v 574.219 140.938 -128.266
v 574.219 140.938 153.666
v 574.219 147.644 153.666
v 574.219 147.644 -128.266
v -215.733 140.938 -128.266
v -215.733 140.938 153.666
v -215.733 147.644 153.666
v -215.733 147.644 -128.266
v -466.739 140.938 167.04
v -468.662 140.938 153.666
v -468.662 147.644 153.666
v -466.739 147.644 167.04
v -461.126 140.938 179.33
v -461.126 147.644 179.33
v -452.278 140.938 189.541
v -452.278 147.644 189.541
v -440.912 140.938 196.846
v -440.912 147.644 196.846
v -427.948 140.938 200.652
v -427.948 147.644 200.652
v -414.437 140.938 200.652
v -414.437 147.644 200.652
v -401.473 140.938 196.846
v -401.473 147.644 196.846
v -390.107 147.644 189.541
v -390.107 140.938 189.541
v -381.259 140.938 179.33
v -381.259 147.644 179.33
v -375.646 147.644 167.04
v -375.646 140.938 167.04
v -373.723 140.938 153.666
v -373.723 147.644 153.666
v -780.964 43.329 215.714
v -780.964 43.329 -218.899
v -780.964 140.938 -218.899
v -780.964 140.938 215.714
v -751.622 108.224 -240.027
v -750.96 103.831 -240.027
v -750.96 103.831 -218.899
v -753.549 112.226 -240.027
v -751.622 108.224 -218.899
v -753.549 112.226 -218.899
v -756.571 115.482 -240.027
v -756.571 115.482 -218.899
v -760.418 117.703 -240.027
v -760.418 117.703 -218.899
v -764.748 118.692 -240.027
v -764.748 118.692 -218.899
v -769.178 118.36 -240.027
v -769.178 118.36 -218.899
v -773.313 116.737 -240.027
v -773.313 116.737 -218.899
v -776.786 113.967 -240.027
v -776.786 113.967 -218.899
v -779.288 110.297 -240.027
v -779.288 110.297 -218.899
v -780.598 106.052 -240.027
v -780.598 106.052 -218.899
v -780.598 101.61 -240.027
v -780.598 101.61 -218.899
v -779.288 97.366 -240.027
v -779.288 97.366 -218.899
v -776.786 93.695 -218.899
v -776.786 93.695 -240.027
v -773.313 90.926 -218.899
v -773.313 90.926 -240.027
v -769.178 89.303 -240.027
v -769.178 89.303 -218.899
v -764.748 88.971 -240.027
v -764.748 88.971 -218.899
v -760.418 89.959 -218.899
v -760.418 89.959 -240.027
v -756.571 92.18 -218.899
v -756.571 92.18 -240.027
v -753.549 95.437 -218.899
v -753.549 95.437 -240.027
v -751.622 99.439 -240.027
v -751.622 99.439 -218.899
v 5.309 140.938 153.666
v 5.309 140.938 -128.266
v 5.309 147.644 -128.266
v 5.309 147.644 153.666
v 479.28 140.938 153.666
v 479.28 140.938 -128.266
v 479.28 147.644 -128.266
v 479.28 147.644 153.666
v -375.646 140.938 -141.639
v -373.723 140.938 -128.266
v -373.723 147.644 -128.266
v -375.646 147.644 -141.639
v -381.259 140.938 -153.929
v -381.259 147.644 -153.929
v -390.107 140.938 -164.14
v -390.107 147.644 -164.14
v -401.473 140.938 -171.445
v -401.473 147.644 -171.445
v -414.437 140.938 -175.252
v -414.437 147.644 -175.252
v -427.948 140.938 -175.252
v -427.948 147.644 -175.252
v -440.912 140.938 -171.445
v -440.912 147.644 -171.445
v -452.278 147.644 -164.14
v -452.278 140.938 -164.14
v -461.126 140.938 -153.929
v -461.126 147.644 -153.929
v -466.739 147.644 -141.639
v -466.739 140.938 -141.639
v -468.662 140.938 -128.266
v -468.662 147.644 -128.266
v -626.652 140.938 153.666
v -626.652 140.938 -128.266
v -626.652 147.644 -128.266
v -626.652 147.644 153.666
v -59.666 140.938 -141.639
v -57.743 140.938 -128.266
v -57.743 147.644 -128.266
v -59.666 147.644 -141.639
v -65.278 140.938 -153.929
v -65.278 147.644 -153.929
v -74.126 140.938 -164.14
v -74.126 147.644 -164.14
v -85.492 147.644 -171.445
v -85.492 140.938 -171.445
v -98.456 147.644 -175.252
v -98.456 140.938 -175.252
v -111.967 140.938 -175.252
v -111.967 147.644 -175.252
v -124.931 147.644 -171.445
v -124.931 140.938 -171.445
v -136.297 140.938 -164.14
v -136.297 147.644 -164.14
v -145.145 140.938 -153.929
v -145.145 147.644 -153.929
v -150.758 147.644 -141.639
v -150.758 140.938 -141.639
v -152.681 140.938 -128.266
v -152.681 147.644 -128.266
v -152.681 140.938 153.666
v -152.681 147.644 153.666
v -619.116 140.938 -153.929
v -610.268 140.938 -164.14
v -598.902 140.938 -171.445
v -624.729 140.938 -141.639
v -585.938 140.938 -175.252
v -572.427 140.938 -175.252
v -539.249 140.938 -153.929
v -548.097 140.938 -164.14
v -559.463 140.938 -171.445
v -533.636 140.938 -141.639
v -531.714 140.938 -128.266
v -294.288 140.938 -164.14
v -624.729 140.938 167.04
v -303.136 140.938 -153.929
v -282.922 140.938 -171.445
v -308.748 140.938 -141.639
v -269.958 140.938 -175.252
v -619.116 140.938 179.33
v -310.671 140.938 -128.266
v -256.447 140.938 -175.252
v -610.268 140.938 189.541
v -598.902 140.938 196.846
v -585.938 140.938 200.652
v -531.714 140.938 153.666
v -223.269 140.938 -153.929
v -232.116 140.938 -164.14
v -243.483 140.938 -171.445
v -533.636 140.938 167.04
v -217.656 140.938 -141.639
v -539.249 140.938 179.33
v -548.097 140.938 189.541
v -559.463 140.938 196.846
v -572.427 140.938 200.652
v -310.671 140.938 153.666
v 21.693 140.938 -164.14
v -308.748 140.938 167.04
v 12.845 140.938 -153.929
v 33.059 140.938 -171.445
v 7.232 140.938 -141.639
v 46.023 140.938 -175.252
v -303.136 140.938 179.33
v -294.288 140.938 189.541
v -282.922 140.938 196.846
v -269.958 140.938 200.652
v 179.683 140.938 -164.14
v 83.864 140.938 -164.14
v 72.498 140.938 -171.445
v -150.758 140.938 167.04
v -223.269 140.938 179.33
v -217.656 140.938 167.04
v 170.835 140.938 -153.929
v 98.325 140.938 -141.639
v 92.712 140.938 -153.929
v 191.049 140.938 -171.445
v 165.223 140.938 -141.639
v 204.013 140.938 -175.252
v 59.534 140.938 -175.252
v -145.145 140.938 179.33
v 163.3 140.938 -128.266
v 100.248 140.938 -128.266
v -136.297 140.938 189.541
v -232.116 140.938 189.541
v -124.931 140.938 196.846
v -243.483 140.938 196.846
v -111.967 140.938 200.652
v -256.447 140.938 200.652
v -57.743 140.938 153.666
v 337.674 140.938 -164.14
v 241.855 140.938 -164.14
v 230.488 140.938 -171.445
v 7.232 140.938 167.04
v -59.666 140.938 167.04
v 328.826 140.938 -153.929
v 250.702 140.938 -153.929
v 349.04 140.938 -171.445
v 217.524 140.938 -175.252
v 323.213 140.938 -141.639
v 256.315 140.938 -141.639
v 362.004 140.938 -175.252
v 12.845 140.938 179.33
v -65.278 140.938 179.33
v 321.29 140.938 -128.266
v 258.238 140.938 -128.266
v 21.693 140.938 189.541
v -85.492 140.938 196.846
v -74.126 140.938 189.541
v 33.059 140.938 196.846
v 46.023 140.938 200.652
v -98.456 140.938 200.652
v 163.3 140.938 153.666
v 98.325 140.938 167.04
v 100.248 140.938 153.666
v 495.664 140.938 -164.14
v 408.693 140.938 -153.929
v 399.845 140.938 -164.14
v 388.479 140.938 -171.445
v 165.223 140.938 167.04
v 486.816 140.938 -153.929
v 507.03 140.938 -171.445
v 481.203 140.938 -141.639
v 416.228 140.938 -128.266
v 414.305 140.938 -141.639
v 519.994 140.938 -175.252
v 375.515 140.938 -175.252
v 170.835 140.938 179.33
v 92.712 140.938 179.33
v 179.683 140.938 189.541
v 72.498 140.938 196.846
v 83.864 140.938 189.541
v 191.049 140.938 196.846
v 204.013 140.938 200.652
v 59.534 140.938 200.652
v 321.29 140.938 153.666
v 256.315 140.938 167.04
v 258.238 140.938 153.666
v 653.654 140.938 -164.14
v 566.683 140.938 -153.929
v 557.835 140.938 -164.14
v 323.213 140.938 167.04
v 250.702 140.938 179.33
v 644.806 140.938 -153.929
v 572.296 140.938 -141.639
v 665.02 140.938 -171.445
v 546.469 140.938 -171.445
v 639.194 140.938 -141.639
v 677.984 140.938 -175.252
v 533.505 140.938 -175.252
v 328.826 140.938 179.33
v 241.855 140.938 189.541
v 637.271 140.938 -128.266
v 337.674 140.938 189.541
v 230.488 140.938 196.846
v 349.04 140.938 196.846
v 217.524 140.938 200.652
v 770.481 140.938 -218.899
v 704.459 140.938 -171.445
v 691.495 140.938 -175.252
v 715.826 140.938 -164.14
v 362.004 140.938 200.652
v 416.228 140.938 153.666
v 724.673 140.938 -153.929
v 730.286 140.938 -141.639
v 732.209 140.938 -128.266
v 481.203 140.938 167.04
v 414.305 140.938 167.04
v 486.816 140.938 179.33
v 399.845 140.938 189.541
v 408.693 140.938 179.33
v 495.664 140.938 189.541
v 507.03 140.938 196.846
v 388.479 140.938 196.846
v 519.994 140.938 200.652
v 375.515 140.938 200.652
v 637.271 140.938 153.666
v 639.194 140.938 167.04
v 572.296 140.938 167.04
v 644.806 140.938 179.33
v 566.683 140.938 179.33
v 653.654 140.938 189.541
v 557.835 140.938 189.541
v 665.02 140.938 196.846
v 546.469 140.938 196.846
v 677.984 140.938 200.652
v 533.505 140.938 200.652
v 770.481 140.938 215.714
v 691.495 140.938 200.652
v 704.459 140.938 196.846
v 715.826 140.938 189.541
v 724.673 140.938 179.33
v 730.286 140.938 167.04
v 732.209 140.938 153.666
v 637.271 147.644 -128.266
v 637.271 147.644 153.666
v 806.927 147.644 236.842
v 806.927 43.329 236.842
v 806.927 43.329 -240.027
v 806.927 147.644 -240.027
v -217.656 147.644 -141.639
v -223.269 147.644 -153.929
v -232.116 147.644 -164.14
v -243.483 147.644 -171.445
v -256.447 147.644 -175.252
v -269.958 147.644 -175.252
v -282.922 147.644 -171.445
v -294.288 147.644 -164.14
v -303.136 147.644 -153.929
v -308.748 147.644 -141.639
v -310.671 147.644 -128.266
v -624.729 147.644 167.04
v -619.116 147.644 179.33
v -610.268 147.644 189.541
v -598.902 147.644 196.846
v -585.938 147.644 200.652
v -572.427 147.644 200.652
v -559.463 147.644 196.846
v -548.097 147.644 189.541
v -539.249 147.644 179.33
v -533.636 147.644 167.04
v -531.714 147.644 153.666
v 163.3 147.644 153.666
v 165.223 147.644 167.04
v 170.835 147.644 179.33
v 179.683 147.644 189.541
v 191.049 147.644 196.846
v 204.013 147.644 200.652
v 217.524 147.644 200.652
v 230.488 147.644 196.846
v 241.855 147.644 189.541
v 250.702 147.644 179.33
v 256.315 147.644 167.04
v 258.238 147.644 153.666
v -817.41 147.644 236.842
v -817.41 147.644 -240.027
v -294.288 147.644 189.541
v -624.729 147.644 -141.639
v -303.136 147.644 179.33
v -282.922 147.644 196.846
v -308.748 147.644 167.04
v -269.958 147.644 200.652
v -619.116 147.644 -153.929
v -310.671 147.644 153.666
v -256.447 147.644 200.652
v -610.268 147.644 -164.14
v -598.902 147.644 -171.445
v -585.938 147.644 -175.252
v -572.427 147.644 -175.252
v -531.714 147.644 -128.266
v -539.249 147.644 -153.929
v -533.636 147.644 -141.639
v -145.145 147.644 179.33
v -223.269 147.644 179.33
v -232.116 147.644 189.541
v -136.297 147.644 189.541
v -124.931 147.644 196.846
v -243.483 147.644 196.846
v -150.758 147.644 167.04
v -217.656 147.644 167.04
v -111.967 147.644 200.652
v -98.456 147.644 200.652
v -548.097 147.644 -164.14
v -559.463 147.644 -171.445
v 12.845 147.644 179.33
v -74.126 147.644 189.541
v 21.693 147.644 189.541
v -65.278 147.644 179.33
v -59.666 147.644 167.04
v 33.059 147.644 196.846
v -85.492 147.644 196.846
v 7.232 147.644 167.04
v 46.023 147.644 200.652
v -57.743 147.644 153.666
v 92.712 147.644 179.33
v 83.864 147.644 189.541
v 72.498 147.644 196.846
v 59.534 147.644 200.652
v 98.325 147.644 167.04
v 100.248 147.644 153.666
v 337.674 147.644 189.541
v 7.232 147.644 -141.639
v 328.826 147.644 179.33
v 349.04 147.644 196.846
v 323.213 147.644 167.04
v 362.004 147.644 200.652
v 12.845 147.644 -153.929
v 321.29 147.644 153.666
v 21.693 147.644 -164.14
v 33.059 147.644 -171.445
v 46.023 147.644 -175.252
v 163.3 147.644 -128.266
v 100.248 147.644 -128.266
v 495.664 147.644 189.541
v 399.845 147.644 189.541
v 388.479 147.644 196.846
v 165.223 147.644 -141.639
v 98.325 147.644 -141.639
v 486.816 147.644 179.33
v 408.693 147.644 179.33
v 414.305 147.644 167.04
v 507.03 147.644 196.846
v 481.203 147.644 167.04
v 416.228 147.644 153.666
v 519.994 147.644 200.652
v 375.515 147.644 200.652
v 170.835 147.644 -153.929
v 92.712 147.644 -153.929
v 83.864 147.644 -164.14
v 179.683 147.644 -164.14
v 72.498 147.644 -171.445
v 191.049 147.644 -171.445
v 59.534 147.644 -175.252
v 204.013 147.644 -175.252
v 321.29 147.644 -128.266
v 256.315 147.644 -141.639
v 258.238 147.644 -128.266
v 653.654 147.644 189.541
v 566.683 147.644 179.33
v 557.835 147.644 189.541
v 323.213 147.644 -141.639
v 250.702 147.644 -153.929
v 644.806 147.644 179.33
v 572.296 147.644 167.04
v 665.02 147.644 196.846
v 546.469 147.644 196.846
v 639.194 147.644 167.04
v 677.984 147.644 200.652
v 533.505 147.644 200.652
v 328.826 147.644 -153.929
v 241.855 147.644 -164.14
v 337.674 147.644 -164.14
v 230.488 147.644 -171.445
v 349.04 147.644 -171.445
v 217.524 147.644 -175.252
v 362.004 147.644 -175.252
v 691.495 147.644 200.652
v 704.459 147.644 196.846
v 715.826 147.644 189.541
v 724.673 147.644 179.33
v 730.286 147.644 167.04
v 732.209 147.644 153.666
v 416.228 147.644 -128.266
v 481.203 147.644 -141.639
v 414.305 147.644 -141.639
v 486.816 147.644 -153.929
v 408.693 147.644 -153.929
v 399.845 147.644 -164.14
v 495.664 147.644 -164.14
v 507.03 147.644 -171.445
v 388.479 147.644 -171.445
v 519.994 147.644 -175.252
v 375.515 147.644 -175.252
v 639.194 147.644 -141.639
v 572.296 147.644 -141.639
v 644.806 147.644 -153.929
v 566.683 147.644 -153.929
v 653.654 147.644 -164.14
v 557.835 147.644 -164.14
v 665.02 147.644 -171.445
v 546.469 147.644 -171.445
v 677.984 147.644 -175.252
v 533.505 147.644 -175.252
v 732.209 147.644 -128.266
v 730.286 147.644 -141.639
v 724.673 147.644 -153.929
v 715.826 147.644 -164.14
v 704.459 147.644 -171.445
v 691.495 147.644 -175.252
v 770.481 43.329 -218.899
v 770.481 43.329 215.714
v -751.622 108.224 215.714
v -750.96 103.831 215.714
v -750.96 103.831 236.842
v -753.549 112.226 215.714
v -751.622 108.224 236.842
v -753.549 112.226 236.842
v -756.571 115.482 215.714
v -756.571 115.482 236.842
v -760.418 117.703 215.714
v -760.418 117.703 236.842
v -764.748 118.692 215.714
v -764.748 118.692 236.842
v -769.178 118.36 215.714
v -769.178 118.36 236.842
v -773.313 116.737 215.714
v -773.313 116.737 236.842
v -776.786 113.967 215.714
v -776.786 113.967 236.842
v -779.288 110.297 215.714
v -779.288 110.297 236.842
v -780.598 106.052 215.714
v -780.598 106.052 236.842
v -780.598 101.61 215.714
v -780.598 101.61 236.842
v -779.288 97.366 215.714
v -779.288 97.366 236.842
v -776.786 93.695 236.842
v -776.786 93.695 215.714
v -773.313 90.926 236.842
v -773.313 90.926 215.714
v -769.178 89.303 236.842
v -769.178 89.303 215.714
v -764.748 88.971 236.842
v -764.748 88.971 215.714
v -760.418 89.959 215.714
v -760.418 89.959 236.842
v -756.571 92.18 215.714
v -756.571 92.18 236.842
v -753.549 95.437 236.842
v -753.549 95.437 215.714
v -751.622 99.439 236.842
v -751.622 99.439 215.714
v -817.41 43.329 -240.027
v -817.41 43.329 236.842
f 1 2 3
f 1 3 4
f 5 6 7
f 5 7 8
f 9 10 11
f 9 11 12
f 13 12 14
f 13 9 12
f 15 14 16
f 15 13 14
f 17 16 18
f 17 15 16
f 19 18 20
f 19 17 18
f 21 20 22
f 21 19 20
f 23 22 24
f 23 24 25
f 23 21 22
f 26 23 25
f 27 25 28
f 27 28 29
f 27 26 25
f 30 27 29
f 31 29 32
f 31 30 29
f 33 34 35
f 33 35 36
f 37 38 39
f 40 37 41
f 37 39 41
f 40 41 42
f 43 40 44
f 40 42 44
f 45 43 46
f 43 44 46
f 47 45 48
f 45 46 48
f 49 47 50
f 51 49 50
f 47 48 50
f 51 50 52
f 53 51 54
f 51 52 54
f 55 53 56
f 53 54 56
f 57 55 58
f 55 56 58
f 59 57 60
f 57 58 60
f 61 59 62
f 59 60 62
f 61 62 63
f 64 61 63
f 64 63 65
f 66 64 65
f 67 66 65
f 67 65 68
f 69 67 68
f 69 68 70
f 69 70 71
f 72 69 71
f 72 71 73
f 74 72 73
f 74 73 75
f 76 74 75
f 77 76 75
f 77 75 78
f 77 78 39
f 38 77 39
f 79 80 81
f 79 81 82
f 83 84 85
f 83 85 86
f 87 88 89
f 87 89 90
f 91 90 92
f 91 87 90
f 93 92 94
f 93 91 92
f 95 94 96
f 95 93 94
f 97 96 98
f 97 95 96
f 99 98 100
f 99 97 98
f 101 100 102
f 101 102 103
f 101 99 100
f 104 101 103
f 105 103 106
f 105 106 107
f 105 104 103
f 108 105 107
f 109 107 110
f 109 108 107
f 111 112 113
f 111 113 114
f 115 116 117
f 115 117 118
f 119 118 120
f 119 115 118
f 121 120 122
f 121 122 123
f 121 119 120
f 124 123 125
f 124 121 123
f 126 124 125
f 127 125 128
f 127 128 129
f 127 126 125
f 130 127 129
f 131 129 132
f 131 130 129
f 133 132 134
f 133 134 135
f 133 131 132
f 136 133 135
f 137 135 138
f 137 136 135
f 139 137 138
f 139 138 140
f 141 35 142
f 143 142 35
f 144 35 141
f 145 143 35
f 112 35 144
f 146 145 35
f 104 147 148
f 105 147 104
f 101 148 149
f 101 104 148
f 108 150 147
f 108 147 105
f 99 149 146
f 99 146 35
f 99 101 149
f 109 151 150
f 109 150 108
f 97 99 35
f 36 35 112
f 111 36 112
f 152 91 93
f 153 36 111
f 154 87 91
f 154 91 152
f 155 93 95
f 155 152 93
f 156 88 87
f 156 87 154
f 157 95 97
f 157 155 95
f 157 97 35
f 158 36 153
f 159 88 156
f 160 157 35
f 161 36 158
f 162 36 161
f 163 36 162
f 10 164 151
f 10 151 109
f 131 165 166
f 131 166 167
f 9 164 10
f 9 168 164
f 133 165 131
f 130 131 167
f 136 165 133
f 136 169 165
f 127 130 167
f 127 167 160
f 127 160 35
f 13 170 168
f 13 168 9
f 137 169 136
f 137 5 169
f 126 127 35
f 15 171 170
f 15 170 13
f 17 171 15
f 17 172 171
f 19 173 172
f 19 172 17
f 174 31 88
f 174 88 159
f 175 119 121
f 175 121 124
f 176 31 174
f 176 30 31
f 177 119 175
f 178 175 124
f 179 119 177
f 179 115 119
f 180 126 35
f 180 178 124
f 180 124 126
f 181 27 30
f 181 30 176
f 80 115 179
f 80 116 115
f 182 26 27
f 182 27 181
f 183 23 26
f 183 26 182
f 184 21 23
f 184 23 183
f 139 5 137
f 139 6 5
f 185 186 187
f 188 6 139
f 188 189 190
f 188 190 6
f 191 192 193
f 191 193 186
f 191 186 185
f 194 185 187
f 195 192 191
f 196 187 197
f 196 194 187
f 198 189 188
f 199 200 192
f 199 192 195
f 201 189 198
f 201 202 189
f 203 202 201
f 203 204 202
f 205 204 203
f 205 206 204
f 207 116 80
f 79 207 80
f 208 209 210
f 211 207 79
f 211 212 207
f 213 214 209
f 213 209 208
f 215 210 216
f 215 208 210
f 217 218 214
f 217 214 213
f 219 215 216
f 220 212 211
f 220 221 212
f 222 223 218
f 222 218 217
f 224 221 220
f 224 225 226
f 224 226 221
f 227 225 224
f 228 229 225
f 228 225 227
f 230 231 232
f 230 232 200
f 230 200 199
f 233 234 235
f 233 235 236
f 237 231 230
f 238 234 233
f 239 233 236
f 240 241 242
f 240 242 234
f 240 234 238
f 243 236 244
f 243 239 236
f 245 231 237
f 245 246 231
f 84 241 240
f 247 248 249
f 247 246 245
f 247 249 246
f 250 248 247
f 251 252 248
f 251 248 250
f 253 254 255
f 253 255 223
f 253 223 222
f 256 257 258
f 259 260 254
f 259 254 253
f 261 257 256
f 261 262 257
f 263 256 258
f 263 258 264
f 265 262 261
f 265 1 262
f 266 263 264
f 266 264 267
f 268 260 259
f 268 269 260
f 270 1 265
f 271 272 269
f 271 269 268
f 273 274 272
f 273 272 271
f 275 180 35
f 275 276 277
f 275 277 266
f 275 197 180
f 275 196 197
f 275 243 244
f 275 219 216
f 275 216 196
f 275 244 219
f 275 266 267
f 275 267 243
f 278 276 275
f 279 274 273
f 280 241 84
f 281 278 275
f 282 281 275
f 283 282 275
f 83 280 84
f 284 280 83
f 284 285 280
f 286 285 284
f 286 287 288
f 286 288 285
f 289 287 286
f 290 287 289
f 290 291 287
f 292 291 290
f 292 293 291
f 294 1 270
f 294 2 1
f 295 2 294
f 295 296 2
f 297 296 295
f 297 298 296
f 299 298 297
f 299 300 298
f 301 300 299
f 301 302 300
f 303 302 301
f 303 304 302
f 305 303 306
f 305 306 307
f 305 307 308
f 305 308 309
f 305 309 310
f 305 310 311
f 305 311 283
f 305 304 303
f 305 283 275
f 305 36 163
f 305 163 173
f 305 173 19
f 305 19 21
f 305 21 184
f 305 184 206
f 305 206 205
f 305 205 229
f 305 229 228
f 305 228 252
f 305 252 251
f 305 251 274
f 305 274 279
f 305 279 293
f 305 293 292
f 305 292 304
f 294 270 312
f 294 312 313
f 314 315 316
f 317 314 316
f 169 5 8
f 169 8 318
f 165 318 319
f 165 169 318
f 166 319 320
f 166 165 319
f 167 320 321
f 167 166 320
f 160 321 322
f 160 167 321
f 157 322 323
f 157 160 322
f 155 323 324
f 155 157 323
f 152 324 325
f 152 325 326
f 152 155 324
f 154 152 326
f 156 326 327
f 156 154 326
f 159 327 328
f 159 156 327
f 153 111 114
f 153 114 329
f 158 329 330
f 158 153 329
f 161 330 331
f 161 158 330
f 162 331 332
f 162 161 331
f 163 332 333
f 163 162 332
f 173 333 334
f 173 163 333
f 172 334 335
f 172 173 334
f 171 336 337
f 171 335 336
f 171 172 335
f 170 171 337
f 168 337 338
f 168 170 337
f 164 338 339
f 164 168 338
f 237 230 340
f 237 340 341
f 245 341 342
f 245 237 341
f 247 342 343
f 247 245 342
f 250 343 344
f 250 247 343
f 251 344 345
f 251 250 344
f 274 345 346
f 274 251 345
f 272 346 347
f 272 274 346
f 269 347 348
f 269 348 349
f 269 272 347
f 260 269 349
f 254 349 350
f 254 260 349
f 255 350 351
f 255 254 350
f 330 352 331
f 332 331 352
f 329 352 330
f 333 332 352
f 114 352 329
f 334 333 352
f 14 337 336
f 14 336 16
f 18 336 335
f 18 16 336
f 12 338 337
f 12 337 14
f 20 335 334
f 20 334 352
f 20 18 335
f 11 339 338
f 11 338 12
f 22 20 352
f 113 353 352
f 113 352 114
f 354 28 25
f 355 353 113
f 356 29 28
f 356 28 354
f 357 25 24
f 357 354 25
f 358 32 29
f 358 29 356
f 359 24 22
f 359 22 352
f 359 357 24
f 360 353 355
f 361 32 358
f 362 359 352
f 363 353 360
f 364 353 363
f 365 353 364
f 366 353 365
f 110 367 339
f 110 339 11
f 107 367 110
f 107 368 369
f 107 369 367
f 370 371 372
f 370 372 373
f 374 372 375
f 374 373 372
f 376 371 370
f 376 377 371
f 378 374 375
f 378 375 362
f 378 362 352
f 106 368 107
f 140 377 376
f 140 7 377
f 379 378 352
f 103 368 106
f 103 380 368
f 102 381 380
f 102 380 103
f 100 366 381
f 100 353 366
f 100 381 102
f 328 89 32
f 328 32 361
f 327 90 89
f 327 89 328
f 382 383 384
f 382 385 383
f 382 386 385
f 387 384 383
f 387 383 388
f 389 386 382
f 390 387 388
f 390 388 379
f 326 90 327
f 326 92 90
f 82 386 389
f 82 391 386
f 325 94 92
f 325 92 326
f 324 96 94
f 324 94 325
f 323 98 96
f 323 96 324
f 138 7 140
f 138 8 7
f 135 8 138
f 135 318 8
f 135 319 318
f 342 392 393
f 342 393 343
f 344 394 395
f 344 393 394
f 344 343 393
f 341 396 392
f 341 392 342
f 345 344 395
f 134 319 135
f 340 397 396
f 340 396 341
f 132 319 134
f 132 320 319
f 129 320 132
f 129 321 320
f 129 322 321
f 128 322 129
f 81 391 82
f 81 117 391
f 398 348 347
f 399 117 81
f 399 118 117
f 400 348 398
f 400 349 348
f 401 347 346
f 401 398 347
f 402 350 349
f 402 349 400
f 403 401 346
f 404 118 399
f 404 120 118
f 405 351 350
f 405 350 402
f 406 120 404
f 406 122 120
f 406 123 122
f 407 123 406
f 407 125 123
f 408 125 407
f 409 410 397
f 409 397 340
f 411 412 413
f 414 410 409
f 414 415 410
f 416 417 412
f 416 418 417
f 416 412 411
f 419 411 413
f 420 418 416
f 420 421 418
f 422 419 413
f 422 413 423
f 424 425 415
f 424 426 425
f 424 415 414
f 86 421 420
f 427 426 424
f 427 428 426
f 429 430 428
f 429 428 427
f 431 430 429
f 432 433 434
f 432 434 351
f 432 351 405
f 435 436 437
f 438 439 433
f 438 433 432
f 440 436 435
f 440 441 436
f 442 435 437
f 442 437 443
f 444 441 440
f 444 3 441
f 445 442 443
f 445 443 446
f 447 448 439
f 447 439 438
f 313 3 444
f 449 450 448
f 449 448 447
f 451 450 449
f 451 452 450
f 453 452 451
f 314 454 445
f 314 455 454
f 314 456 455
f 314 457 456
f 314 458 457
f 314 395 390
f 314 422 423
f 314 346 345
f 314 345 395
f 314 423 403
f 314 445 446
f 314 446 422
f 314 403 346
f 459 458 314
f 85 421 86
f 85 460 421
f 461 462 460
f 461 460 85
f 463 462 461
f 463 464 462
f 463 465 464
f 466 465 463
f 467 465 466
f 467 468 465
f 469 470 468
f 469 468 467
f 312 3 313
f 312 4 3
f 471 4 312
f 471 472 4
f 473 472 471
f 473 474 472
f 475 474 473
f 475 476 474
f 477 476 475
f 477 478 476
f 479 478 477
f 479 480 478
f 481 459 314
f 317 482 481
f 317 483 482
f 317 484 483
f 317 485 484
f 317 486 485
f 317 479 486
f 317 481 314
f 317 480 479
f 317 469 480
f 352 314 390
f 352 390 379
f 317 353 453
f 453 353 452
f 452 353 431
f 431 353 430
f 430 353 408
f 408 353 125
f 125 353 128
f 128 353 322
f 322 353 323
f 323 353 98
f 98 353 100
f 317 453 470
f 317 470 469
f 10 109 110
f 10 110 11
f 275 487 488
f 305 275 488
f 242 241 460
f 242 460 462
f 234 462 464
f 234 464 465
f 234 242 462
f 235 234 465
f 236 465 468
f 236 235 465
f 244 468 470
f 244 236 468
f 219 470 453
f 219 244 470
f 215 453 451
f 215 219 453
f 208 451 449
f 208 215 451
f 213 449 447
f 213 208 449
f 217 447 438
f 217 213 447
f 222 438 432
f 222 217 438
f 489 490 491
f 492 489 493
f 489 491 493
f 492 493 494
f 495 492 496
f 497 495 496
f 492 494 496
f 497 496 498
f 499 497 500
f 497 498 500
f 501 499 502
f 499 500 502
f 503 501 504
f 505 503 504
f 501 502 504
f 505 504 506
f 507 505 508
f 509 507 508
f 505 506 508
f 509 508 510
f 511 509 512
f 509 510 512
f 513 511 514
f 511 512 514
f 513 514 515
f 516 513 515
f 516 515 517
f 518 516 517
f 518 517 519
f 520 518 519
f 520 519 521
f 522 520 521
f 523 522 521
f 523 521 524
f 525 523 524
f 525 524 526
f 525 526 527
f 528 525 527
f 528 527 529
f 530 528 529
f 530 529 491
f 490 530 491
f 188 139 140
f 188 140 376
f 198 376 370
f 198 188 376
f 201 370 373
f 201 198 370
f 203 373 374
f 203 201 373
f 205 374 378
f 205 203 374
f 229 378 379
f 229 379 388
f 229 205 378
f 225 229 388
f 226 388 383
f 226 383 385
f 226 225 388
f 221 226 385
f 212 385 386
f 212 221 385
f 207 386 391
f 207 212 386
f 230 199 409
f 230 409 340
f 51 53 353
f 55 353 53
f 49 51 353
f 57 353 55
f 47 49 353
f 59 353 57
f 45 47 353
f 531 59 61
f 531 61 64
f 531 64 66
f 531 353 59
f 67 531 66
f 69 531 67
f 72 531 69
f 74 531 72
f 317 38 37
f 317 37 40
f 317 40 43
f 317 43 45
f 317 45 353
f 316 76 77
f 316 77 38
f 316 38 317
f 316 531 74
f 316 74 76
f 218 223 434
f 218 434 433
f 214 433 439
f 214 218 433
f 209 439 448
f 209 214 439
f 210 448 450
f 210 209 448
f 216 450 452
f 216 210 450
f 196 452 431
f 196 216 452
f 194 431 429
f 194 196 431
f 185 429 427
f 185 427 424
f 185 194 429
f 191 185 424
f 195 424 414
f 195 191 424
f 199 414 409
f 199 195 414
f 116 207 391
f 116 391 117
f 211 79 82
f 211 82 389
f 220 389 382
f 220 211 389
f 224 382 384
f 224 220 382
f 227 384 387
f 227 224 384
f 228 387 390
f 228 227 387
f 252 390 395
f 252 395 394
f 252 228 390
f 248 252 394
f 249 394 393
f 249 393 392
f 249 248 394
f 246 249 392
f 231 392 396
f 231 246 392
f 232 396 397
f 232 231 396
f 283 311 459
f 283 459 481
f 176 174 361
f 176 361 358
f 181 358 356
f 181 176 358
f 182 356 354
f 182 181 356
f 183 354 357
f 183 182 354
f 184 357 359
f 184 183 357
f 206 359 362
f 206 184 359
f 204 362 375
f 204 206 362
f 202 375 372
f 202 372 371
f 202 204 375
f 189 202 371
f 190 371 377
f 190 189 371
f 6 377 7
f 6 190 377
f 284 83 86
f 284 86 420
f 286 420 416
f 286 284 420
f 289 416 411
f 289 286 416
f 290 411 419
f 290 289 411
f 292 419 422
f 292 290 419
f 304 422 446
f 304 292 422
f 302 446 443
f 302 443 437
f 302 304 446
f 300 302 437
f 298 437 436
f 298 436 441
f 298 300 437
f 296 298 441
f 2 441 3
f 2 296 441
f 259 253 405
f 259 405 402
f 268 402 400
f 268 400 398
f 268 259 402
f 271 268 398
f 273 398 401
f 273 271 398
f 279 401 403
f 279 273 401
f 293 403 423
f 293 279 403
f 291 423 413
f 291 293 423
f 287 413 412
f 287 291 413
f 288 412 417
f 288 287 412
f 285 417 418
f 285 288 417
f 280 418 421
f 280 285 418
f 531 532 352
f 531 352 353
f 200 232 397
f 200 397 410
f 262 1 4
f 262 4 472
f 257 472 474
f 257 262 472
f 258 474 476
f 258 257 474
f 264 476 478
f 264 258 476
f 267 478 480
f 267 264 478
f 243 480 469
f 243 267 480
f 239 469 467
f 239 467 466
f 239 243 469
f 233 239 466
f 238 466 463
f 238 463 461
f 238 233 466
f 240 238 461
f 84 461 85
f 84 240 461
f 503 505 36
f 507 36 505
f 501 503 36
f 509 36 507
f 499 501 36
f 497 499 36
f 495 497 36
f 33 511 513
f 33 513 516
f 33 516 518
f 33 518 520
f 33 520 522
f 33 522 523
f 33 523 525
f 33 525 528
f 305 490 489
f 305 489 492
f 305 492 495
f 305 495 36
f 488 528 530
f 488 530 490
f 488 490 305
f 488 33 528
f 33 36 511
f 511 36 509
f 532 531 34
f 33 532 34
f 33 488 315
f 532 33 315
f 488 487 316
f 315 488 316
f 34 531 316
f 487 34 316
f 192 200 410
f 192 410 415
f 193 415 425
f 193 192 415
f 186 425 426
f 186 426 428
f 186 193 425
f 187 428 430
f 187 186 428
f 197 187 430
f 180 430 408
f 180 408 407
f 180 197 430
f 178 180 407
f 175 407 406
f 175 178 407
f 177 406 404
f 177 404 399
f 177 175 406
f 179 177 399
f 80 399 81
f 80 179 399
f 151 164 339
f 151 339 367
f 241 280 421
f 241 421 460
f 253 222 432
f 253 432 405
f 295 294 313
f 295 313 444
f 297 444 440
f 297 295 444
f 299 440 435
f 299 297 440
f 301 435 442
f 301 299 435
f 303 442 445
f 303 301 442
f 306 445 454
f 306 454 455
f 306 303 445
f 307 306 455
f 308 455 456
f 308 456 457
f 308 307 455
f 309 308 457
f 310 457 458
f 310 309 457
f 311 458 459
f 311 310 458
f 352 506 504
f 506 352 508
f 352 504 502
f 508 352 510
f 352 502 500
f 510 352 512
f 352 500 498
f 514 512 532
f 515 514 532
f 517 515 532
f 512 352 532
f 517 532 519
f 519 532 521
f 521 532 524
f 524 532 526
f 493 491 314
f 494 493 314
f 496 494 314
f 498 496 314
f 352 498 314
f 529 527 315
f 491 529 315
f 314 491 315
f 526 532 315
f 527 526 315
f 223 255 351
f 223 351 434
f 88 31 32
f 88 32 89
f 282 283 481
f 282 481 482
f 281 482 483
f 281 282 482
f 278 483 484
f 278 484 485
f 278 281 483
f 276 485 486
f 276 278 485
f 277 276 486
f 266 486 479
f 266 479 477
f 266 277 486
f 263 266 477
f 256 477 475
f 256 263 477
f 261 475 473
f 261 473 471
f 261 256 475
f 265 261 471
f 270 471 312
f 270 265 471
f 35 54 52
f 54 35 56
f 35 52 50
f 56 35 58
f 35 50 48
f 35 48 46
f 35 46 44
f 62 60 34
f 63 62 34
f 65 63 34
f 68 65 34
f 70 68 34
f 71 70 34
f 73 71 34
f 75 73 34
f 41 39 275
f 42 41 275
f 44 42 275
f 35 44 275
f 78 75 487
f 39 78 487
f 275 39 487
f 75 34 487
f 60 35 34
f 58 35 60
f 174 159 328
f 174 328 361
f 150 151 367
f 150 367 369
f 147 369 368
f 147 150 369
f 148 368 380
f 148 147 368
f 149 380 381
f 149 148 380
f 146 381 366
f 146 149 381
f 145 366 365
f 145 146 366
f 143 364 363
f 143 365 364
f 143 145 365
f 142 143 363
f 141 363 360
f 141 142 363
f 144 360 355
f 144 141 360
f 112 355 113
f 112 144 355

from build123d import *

# Parameters (mm, degrees)
SKETCH1_W           = 2768.6
SKETCH1_H           = 812.8
BOSS_EXTRUDE1_DEPTH = 177.8
SKETCH2_R           = 25.4
CUT_EXTRUDE1_DEPTH  = 831.342
SKETCH3_W           = 2644.359498688
SKETCH3_H           = 740.774814922
CUT_EXTRUDE2_DEPTH  = 166.37
CUT_EXTRUDE3_DEPTH  = 57.912
FILL_START          = 166.37
FILL_PATTERN1_DEPTH = 11.43
SCALE1_SCALE        = 0.5867


# Read off the part's stored shape, not the designer's step: Fill Pattern1
with BuildPart() as part:
    # Sketch1 → Boss-Extrude1 (new body)
    with BuildSketch(Plane(origin=(0, 0, 0), x_dir=(1, 0, 0), z_dir=(0, 1, 0))):
        Rectangle(SKETCH1_W, SKETCH1_H)
    extrude(amount=BOSS_EXTRUDE1_DEPTH)

    # Sketch2 → Cut-Extrude1 (cut)
    with BuildSketch(Plane.XY.offset(406.4)):
        with Locations((-1296.438284971, 103.124)):
            Circle(SKETCH2_R)
    extrude(amount=-CUT_EXTRUDE1_DEPTH, mode=Mode.SUBTRACT)

    # Sketch3 → Cut-Extrude2 (cut)
    with BuildSketch(Plane.XZ):
        Rectangle(SKETCH3_W, SKETCH3_H)
    extrude(amount=-CUT_EXTRUDE2_DEPTH, mode=Mode.SUBTRACT)

    # Sketch12 → Cut-Extrude3 (cut)
    with BuildSketch(Plane.XZ.offset(-166.37)):
        with BuildLine():
            Line((-897.344557037, 264.630737371), (-897.344557037, -215.907837093))
            ThreePointArc((-897.344557037, -215.907837093), (-978.253251545, -296.816531601), (-1059.161946053, -215.907837093))
            Line((-1059.161946053, -215.907837093), (-1059.161946053, 264.630737371))
            ThreePointArc((-1059.161946053, 264.630737371), (-978.253251545, 345.539431879), (-897.344557037, 264.630737371))
        make_face()
    extrude(amount=-CUT_EXTRUDE3_DEPTH, mode=Mode.SUBTRACT)

    # Fill Pattern1 outline → Fill Pattern1 (cut)
    with BuildSketch(Plane(origin=(0, 0, 0), x_dir=(1, 0, 0), z_dir=(0, 1, 0)).offset(FILL_START)):
        with BuildLine():
            ThreePointArc((-789.87554691, -264.630737371), (-708.966852402, -345.539431879), (-628.058157894, -264.630737371))
            Line((-628.058157894, -264.630737371), (-628.058157894, 215.907837093))
            ThreePointArc((-628.058157894, 215.907837093), (-708.966852402, 296.816531601), (-789.87554691, 215.907837093))
            Line((-789.87554691, 215.907837093), (-789.87554691, -264.630737371))
        make_face()
        with BuildLine():
            ThreePointArc((1095.129247093, -264.630737371), (1176.0379416, -345.539431879), (1256.946636108, -264.630737371))
            Line((1256.946636108, -264.630737371), (1256.946636108, 215.907837093))
            ThreePointArc((1256.946636108, 215.907837093), (1176.0379416, 296.816531601), (1095.129247093, 215.907837093))
            Line((1095.129247093, 215.907837093), (1095.129247093, -264.630737371))
        make_face()
        with BuildLine():
            ThreePointArc((825.842847949, -264.630737371), (906.751542457, -345.539431879), (987.660236965, -264.630737371))
            Line((987.660236965, -264.630737371), (987.660236965, 215.907837093))
            ThreePointArc((987.660236965, 215.907837093), (906.751542457, 296.816531601), (825.842847949, 215.907837093))
            Line((825.842847949, 215.907837093), (825.842847949, -264.630737371))
        make_face()
        with BuildLine():
            ThreePointArc((556.556448806, -264.630737371), (637.465143314, -345.539431879), (718.373837822, -264.630737371))
            Line((718.373837822, -264.630737371), (718.373837822, 215.907837093))
            ThreePointArc((718.373837822, 215.907837093), (637.465143314, 296.816531601), (556.556448806, 215.907837093))
            Line((556.556448806, 215.907837093), (556.556448806, -264.630737371))
        make_face()
        with BuildLine():
            ThreePointArc((287.270049663, -264.630737371), (368.178744171, -345.539431879), (449.087438678, -264.630737371))
            Line((449.087438678, -264.630737371), (449.087438678, 215.907837093))
            ThreePointArc((449.087438678, 215.907837093), (368.178744171, 296.816531601), (287.270049663, 215.907837093))
            Line((287.270049663, 215.907837093), (287.270049663, -264.630737371))
        make_face()
        with BuildLine():
            ThreePointArc((17.98365052, -264.630737371), (98.892345027, -345.539431879), (179.801039535, -264.630737371))
            Line((179.801039535, -264.630737371), (179.801039535, 215.907837093))
            ThreePointArc((179.801039535, 215.907837093), (98.892345027, 296.816531601), (17.98365052, 215.907837093))
            Line((17.98365052, 215.907837093), (17.98365052, -264.630737371))
        make_face()
        with BuildLine():
            ThreePointArc((-251.302748623, -264.630737371), (-170.394054116, -345.539431879), (-89.485359608, -264.630737371))
            Line((-89.485359608, -264.630737371), (-89.485359608, 215.907837093))
            ThreePointArc((-89.485359608, 215.907837093), (-170.394054116, 296.816531601), (-251.302748623, 215.907837093))
            Line((-251.302748623, 215.907837093), (-251.302748623, -264.630737371))
        make_face()
        with BuildLine():
            ThreePointArc((-520.589147766, -264.630737371), (-439.680453258, -345.539431879), (-358.771758751, -264.630737371))
            Line((-358.771758751, -264.630737371), (-358.771758751, 215.907837093))
            ThreePointArc((-358.771758751, 215.907837093), (-439.680453258, 296.816531601), (-520.589147766, 215.907837093))
            Line((-520.589147766, 215.907837093), (-520.589147766, -264.630737371))
        make_face()
    extrude(amount=FILL_PATTERN1_DEPTH, mode=Mode.SUBTRACT)


with BuildPart() as part_1:
    # Scale1: scaled about (-12.682340198, 104.835478071, -3.853275395)
    add(part.part.scale(SCALE1_SCALE).moved(Location((-5.241611204, 43.328503087, -1.592558721))))


solid = part_1.part
